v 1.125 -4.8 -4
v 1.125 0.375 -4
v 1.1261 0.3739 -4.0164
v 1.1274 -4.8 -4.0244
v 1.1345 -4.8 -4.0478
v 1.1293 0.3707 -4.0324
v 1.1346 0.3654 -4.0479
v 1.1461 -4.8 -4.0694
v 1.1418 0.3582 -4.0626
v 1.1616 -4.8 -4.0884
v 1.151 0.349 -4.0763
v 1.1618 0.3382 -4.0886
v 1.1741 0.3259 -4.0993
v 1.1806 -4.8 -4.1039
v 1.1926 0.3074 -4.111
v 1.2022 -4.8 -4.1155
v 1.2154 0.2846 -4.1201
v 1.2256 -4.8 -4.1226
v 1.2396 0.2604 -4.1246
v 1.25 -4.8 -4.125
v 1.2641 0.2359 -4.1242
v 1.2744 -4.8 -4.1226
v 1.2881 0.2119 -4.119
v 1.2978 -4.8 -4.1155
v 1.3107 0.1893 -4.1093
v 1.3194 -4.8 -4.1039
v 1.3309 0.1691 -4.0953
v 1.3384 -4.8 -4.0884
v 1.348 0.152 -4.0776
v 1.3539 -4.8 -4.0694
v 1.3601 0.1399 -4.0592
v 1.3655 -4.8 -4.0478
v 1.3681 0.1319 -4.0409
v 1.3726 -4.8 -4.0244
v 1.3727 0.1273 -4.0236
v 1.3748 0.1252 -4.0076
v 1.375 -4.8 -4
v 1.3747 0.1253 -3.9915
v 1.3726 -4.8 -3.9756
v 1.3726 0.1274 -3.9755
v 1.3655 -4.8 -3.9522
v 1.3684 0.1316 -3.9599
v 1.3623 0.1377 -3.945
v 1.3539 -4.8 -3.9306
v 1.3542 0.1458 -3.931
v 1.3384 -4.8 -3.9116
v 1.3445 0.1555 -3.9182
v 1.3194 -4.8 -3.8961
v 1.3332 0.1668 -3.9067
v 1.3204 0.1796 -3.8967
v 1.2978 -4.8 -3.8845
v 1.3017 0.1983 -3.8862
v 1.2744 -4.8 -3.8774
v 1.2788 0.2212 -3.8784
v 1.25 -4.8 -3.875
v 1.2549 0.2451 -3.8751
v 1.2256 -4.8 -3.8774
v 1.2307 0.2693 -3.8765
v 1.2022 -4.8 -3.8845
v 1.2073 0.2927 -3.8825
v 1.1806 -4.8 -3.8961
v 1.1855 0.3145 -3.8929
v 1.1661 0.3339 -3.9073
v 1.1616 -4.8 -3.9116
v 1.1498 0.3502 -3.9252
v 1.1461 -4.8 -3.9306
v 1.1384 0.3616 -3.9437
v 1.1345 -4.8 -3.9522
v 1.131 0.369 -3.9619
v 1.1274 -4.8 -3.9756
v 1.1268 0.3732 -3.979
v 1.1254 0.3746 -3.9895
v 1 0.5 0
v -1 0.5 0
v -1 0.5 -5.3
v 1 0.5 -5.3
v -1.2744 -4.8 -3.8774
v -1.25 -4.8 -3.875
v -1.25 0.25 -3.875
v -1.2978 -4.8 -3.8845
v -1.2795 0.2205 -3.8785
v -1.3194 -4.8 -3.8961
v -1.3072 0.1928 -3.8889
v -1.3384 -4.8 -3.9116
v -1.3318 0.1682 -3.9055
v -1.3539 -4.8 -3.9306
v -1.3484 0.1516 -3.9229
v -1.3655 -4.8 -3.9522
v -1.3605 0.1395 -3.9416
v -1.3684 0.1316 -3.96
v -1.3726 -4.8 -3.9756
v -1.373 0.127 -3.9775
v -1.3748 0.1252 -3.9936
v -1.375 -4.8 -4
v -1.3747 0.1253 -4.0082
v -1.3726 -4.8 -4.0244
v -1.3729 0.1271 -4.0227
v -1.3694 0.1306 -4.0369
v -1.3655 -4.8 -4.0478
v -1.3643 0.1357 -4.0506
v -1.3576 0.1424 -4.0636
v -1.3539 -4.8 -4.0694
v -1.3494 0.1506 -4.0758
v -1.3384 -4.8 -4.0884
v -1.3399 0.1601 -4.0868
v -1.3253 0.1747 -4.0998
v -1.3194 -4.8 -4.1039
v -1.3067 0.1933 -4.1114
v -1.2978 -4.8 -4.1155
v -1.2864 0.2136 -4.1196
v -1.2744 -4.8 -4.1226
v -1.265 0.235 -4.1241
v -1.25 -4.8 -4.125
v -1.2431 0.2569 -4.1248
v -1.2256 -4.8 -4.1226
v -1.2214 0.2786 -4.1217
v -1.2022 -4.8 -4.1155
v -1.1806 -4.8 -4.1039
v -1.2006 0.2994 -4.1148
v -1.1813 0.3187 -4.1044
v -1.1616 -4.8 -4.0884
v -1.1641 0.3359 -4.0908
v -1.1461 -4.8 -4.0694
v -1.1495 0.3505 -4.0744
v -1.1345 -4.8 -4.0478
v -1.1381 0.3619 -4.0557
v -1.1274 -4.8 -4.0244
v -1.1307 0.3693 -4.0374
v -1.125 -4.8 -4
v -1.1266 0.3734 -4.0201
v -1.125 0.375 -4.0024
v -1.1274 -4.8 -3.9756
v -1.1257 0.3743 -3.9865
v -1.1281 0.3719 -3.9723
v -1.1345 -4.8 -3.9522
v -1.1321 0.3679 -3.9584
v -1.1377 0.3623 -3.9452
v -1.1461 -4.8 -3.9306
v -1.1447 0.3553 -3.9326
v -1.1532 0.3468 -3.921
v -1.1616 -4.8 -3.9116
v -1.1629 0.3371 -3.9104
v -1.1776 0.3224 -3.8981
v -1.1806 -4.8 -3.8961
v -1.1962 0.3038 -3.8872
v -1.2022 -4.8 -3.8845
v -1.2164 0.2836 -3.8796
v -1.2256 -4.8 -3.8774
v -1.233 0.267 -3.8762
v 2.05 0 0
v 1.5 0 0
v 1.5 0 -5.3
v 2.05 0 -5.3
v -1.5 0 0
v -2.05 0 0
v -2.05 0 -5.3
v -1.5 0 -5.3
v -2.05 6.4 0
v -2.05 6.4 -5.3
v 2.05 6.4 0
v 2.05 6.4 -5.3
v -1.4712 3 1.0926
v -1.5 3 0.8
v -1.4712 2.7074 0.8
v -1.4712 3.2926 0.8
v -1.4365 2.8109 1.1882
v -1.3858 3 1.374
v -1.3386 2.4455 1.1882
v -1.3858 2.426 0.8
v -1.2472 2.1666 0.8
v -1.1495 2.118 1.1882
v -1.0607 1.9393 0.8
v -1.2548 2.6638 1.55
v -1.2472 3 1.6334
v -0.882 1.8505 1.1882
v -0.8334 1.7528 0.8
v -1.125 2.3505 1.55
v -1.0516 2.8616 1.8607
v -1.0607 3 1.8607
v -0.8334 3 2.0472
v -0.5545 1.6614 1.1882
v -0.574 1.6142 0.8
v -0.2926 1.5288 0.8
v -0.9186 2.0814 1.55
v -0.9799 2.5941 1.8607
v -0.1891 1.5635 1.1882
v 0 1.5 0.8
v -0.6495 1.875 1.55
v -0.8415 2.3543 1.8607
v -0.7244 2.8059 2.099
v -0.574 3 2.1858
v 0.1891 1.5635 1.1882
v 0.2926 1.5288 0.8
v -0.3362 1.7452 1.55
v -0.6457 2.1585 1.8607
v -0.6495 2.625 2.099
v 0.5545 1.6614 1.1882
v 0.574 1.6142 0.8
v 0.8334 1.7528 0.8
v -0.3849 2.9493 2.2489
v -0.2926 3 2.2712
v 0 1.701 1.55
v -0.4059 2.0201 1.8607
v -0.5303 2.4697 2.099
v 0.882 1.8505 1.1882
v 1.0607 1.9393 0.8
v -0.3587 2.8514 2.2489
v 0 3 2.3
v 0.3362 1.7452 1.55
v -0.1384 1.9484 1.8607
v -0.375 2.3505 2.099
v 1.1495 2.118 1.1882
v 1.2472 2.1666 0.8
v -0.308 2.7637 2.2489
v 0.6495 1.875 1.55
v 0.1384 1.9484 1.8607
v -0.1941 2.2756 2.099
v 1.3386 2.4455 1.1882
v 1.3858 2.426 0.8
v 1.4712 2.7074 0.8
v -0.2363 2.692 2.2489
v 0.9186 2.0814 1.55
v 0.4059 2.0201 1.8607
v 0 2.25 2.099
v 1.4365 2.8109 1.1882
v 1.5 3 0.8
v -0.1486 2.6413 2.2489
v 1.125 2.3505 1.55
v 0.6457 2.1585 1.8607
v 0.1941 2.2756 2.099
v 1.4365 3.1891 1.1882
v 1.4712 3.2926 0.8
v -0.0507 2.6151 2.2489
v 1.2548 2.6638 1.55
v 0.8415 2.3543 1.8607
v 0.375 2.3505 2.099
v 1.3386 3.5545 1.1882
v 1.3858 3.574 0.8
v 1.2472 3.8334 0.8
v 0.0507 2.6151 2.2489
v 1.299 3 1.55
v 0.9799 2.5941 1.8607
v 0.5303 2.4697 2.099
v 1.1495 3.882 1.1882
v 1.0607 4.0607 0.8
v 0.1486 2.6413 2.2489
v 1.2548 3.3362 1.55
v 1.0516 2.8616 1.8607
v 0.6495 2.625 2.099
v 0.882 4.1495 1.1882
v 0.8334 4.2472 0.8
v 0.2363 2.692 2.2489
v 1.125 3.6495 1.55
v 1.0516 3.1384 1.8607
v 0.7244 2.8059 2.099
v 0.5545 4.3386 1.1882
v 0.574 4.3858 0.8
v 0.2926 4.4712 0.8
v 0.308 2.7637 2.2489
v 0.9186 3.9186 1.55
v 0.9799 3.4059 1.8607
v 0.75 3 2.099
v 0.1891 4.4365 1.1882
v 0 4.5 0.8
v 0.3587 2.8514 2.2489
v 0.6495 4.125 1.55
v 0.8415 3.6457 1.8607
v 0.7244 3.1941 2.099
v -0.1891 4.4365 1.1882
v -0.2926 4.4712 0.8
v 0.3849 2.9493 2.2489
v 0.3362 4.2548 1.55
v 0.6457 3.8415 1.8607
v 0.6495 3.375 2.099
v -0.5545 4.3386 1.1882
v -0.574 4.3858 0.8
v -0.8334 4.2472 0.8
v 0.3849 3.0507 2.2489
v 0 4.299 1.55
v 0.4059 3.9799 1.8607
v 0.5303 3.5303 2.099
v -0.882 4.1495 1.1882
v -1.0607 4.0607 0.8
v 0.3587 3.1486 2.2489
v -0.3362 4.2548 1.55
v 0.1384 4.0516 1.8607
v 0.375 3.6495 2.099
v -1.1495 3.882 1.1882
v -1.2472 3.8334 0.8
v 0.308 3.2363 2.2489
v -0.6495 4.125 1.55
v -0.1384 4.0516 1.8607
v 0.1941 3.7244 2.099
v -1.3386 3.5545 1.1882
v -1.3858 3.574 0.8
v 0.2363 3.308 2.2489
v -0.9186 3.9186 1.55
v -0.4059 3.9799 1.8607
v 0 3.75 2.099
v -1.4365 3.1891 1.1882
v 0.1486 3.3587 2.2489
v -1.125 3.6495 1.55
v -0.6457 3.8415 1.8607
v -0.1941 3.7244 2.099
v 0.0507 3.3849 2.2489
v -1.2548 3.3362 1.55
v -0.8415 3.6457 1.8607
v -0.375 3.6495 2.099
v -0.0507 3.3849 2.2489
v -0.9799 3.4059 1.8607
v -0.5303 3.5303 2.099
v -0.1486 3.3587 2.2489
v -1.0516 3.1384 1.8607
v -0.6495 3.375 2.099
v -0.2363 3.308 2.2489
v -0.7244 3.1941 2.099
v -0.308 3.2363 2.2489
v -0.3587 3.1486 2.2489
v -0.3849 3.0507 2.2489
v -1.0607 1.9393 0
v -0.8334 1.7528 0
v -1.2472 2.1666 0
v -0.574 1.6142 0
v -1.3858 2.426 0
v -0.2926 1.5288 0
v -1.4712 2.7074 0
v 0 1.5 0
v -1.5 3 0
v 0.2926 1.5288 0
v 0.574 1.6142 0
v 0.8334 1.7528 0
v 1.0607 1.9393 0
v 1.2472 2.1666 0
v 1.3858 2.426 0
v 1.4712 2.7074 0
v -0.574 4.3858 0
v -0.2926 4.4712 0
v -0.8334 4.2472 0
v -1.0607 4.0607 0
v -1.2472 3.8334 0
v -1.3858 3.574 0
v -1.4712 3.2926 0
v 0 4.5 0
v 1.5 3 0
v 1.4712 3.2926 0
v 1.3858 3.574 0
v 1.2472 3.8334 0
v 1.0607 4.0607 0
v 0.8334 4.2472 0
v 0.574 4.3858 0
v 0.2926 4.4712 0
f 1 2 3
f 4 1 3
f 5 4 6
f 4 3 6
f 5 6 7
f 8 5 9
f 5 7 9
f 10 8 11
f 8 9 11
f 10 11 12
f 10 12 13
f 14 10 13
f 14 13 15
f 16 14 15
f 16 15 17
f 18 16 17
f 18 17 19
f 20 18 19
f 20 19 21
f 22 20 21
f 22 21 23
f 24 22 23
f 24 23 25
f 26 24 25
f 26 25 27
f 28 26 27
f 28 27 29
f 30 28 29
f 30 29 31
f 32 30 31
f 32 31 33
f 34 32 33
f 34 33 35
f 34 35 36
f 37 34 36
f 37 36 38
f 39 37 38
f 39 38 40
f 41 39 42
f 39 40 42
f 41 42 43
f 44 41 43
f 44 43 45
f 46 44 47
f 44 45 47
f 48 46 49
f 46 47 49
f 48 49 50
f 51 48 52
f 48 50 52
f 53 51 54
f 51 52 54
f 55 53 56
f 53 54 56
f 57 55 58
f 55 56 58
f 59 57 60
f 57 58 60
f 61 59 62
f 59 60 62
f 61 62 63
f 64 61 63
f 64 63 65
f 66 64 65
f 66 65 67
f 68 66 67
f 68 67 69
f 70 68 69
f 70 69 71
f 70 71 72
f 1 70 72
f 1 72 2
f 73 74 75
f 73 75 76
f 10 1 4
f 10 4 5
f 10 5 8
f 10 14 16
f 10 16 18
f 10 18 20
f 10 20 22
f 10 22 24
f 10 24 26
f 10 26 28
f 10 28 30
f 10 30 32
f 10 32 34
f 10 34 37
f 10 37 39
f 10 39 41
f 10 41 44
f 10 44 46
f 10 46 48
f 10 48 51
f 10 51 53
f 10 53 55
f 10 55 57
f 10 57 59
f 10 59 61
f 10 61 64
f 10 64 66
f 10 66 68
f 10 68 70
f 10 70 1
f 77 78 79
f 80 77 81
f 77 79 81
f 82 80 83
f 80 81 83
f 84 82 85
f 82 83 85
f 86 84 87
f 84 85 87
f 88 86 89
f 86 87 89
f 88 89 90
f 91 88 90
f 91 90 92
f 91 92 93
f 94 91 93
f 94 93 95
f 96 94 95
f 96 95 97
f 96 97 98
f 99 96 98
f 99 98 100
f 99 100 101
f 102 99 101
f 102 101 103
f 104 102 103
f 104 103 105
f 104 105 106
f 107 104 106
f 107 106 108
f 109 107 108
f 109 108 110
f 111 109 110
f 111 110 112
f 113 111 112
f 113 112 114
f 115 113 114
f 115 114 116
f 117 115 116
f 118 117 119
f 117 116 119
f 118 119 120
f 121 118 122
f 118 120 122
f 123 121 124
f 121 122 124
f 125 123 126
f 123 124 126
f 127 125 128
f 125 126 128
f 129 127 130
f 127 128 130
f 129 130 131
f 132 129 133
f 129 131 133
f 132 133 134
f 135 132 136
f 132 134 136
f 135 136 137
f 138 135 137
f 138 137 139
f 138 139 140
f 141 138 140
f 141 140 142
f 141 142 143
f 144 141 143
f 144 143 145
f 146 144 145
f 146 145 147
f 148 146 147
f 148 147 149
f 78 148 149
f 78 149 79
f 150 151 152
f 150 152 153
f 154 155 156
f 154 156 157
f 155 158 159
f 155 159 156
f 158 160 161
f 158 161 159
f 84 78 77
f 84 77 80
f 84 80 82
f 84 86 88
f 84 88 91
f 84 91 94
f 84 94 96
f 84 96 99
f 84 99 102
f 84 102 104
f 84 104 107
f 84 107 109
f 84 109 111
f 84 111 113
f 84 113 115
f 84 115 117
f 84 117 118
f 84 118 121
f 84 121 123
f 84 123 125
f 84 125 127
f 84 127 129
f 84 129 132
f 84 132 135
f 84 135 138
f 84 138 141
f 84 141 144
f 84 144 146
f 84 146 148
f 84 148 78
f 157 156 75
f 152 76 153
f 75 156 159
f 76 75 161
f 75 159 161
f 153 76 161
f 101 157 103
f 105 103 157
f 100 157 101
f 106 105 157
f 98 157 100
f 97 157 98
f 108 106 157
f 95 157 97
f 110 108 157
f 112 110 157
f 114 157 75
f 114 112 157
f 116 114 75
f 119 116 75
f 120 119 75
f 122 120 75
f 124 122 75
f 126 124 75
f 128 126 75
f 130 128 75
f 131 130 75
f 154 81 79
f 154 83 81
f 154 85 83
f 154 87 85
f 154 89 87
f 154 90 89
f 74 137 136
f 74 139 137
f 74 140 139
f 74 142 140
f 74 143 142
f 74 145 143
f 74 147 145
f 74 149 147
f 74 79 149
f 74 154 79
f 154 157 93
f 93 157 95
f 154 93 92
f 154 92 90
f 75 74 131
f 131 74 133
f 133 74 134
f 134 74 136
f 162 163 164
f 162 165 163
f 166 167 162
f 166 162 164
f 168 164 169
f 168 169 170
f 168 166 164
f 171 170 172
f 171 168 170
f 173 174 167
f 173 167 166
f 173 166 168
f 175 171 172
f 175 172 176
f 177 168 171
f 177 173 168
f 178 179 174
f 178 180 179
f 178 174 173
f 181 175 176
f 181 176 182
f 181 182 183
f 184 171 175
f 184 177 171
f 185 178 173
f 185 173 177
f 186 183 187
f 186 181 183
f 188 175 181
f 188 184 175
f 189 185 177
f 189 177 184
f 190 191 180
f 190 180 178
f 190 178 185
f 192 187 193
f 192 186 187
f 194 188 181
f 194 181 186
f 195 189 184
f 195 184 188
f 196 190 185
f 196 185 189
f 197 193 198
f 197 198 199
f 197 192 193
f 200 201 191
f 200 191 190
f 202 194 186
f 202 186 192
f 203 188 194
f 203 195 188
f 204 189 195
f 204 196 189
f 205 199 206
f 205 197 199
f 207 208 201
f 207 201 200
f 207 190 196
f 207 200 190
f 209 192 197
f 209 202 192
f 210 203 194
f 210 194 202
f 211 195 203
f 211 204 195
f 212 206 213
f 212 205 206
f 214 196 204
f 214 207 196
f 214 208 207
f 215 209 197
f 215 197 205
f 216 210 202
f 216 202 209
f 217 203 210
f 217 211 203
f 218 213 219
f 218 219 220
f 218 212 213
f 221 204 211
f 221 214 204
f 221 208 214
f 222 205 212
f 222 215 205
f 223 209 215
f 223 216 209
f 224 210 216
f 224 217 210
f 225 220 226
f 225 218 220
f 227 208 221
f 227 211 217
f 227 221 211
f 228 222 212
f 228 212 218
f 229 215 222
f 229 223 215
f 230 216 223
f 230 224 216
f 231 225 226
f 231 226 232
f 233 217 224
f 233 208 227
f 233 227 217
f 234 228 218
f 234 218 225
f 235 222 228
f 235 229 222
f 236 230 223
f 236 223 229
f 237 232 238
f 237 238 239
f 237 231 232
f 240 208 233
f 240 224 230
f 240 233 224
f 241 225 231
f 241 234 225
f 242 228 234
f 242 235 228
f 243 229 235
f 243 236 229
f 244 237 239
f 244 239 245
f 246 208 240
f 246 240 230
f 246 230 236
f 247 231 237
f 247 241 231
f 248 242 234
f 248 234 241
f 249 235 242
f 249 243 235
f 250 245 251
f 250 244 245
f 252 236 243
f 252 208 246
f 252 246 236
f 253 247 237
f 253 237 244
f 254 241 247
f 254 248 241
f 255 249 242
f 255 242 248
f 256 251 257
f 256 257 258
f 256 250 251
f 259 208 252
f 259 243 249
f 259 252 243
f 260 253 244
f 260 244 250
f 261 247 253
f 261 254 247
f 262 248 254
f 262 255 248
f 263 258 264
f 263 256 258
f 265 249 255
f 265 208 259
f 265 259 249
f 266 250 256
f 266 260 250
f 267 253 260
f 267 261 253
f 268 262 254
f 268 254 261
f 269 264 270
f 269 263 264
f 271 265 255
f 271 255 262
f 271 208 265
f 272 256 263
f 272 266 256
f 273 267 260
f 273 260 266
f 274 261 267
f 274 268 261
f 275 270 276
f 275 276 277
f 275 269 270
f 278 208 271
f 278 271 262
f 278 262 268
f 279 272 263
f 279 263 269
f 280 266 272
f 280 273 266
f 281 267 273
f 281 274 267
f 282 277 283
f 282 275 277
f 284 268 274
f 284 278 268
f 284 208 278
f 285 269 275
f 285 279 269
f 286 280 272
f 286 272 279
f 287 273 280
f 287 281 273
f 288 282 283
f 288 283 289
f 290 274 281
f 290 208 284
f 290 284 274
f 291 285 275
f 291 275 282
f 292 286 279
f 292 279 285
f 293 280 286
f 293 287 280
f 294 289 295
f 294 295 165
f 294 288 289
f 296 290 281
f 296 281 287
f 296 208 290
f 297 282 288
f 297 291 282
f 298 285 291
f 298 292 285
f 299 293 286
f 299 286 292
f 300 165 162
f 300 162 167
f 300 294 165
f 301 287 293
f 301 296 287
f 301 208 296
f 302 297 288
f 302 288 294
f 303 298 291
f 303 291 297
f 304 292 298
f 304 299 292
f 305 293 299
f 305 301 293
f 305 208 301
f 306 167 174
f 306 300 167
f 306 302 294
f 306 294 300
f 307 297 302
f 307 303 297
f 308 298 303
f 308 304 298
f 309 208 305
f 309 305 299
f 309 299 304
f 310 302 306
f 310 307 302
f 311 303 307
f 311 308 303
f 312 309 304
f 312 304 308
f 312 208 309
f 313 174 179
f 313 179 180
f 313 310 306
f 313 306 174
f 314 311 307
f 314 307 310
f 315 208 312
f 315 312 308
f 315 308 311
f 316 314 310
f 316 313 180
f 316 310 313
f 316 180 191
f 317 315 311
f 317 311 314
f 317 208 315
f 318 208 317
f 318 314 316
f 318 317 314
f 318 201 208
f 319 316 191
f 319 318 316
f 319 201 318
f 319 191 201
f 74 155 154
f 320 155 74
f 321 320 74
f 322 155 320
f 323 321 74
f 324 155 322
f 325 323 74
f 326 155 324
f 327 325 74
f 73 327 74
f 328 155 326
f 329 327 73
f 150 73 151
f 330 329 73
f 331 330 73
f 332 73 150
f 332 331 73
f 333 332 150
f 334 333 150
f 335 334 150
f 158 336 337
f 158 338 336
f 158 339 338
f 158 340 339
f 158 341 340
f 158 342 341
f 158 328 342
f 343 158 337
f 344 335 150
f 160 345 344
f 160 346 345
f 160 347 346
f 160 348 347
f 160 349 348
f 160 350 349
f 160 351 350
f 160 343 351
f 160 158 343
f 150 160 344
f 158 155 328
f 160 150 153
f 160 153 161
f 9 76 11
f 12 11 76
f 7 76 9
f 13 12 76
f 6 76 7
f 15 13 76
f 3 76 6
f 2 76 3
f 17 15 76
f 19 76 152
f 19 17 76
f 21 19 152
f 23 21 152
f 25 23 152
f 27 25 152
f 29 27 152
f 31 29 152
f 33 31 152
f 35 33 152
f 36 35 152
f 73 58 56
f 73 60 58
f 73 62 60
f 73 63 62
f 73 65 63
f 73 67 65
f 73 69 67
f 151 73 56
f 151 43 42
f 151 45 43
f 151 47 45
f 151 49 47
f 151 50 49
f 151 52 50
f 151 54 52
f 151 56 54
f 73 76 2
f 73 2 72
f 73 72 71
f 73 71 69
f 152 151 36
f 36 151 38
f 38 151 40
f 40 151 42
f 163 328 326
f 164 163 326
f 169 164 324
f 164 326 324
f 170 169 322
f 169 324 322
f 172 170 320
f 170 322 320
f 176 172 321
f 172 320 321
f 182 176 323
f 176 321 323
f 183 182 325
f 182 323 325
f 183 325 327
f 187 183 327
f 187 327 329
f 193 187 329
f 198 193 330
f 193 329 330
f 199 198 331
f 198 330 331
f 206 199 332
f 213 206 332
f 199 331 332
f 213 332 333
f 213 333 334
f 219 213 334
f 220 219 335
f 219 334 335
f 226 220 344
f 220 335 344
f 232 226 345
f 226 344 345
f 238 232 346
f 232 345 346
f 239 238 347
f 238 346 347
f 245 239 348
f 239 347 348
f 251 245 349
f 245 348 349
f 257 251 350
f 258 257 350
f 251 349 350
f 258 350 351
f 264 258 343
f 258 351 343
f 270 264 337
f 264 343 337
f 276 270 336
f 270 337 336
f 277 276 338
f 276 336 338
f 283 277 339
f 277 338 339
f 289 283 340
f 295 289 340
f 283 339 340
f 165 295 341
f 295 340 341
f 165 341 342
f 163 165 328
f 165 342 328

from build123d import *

# Parameters (mm, degrees)
EXTRUDE1_DEPTH = 5.3
SKETCH2_R      = 1.5
EXTRUDE2_DEPTH = 2.3
FILLET1_R      = 1.5
SKETCH3_R      = 0.125
EXTRUDE3_DEPTH = 5.3


with BuildPart() as part:
    # Sketch1 → Extrude1 (new body)
    with BuildSketch(Plane.XY):
        Polygon((-1, 0.5), (1, 0.5), (1.5, 0), (2.05, 0), (2.05, 6.4), (-2.05, 6.4), (-2.05, 0), (-1.5, 0), align=None)
    extrude(amount=-EXTRUDE1_DEPTH)

    # Sketch2 → Extrude2 (add)
    with BuildSketch(Plane.XY):
        with Locations(Location((0, 3, 0), (0, 0, 180))):
            Circle(SKETCH2_R)
    extrude(amount=EXTRUDE2_DEPTH)

    # Fillet1
    fillet1_edges = [part.edges().sort_by_distance(p)[0] for p in [
        (1.5, 3, 2.3),
    ]]
    fillet(fillet1_edges, radius=FILLET1_R)

    # Sketch3 → Extrude3 (add)
    with BuildSketch(Plane.XZ.offset(-0.5)):
        with Locations(Location((1.25, -4, 0), (0, 0, 180))):
            Circle(SKETCH3_R)
        with Locations(Location((-1.25, -4, 0), (0, 0, 90))):
            Circle(SKETCH3_R)
    extrude(amount=EXTRUDE3_DEPTH)


solid = part.part
